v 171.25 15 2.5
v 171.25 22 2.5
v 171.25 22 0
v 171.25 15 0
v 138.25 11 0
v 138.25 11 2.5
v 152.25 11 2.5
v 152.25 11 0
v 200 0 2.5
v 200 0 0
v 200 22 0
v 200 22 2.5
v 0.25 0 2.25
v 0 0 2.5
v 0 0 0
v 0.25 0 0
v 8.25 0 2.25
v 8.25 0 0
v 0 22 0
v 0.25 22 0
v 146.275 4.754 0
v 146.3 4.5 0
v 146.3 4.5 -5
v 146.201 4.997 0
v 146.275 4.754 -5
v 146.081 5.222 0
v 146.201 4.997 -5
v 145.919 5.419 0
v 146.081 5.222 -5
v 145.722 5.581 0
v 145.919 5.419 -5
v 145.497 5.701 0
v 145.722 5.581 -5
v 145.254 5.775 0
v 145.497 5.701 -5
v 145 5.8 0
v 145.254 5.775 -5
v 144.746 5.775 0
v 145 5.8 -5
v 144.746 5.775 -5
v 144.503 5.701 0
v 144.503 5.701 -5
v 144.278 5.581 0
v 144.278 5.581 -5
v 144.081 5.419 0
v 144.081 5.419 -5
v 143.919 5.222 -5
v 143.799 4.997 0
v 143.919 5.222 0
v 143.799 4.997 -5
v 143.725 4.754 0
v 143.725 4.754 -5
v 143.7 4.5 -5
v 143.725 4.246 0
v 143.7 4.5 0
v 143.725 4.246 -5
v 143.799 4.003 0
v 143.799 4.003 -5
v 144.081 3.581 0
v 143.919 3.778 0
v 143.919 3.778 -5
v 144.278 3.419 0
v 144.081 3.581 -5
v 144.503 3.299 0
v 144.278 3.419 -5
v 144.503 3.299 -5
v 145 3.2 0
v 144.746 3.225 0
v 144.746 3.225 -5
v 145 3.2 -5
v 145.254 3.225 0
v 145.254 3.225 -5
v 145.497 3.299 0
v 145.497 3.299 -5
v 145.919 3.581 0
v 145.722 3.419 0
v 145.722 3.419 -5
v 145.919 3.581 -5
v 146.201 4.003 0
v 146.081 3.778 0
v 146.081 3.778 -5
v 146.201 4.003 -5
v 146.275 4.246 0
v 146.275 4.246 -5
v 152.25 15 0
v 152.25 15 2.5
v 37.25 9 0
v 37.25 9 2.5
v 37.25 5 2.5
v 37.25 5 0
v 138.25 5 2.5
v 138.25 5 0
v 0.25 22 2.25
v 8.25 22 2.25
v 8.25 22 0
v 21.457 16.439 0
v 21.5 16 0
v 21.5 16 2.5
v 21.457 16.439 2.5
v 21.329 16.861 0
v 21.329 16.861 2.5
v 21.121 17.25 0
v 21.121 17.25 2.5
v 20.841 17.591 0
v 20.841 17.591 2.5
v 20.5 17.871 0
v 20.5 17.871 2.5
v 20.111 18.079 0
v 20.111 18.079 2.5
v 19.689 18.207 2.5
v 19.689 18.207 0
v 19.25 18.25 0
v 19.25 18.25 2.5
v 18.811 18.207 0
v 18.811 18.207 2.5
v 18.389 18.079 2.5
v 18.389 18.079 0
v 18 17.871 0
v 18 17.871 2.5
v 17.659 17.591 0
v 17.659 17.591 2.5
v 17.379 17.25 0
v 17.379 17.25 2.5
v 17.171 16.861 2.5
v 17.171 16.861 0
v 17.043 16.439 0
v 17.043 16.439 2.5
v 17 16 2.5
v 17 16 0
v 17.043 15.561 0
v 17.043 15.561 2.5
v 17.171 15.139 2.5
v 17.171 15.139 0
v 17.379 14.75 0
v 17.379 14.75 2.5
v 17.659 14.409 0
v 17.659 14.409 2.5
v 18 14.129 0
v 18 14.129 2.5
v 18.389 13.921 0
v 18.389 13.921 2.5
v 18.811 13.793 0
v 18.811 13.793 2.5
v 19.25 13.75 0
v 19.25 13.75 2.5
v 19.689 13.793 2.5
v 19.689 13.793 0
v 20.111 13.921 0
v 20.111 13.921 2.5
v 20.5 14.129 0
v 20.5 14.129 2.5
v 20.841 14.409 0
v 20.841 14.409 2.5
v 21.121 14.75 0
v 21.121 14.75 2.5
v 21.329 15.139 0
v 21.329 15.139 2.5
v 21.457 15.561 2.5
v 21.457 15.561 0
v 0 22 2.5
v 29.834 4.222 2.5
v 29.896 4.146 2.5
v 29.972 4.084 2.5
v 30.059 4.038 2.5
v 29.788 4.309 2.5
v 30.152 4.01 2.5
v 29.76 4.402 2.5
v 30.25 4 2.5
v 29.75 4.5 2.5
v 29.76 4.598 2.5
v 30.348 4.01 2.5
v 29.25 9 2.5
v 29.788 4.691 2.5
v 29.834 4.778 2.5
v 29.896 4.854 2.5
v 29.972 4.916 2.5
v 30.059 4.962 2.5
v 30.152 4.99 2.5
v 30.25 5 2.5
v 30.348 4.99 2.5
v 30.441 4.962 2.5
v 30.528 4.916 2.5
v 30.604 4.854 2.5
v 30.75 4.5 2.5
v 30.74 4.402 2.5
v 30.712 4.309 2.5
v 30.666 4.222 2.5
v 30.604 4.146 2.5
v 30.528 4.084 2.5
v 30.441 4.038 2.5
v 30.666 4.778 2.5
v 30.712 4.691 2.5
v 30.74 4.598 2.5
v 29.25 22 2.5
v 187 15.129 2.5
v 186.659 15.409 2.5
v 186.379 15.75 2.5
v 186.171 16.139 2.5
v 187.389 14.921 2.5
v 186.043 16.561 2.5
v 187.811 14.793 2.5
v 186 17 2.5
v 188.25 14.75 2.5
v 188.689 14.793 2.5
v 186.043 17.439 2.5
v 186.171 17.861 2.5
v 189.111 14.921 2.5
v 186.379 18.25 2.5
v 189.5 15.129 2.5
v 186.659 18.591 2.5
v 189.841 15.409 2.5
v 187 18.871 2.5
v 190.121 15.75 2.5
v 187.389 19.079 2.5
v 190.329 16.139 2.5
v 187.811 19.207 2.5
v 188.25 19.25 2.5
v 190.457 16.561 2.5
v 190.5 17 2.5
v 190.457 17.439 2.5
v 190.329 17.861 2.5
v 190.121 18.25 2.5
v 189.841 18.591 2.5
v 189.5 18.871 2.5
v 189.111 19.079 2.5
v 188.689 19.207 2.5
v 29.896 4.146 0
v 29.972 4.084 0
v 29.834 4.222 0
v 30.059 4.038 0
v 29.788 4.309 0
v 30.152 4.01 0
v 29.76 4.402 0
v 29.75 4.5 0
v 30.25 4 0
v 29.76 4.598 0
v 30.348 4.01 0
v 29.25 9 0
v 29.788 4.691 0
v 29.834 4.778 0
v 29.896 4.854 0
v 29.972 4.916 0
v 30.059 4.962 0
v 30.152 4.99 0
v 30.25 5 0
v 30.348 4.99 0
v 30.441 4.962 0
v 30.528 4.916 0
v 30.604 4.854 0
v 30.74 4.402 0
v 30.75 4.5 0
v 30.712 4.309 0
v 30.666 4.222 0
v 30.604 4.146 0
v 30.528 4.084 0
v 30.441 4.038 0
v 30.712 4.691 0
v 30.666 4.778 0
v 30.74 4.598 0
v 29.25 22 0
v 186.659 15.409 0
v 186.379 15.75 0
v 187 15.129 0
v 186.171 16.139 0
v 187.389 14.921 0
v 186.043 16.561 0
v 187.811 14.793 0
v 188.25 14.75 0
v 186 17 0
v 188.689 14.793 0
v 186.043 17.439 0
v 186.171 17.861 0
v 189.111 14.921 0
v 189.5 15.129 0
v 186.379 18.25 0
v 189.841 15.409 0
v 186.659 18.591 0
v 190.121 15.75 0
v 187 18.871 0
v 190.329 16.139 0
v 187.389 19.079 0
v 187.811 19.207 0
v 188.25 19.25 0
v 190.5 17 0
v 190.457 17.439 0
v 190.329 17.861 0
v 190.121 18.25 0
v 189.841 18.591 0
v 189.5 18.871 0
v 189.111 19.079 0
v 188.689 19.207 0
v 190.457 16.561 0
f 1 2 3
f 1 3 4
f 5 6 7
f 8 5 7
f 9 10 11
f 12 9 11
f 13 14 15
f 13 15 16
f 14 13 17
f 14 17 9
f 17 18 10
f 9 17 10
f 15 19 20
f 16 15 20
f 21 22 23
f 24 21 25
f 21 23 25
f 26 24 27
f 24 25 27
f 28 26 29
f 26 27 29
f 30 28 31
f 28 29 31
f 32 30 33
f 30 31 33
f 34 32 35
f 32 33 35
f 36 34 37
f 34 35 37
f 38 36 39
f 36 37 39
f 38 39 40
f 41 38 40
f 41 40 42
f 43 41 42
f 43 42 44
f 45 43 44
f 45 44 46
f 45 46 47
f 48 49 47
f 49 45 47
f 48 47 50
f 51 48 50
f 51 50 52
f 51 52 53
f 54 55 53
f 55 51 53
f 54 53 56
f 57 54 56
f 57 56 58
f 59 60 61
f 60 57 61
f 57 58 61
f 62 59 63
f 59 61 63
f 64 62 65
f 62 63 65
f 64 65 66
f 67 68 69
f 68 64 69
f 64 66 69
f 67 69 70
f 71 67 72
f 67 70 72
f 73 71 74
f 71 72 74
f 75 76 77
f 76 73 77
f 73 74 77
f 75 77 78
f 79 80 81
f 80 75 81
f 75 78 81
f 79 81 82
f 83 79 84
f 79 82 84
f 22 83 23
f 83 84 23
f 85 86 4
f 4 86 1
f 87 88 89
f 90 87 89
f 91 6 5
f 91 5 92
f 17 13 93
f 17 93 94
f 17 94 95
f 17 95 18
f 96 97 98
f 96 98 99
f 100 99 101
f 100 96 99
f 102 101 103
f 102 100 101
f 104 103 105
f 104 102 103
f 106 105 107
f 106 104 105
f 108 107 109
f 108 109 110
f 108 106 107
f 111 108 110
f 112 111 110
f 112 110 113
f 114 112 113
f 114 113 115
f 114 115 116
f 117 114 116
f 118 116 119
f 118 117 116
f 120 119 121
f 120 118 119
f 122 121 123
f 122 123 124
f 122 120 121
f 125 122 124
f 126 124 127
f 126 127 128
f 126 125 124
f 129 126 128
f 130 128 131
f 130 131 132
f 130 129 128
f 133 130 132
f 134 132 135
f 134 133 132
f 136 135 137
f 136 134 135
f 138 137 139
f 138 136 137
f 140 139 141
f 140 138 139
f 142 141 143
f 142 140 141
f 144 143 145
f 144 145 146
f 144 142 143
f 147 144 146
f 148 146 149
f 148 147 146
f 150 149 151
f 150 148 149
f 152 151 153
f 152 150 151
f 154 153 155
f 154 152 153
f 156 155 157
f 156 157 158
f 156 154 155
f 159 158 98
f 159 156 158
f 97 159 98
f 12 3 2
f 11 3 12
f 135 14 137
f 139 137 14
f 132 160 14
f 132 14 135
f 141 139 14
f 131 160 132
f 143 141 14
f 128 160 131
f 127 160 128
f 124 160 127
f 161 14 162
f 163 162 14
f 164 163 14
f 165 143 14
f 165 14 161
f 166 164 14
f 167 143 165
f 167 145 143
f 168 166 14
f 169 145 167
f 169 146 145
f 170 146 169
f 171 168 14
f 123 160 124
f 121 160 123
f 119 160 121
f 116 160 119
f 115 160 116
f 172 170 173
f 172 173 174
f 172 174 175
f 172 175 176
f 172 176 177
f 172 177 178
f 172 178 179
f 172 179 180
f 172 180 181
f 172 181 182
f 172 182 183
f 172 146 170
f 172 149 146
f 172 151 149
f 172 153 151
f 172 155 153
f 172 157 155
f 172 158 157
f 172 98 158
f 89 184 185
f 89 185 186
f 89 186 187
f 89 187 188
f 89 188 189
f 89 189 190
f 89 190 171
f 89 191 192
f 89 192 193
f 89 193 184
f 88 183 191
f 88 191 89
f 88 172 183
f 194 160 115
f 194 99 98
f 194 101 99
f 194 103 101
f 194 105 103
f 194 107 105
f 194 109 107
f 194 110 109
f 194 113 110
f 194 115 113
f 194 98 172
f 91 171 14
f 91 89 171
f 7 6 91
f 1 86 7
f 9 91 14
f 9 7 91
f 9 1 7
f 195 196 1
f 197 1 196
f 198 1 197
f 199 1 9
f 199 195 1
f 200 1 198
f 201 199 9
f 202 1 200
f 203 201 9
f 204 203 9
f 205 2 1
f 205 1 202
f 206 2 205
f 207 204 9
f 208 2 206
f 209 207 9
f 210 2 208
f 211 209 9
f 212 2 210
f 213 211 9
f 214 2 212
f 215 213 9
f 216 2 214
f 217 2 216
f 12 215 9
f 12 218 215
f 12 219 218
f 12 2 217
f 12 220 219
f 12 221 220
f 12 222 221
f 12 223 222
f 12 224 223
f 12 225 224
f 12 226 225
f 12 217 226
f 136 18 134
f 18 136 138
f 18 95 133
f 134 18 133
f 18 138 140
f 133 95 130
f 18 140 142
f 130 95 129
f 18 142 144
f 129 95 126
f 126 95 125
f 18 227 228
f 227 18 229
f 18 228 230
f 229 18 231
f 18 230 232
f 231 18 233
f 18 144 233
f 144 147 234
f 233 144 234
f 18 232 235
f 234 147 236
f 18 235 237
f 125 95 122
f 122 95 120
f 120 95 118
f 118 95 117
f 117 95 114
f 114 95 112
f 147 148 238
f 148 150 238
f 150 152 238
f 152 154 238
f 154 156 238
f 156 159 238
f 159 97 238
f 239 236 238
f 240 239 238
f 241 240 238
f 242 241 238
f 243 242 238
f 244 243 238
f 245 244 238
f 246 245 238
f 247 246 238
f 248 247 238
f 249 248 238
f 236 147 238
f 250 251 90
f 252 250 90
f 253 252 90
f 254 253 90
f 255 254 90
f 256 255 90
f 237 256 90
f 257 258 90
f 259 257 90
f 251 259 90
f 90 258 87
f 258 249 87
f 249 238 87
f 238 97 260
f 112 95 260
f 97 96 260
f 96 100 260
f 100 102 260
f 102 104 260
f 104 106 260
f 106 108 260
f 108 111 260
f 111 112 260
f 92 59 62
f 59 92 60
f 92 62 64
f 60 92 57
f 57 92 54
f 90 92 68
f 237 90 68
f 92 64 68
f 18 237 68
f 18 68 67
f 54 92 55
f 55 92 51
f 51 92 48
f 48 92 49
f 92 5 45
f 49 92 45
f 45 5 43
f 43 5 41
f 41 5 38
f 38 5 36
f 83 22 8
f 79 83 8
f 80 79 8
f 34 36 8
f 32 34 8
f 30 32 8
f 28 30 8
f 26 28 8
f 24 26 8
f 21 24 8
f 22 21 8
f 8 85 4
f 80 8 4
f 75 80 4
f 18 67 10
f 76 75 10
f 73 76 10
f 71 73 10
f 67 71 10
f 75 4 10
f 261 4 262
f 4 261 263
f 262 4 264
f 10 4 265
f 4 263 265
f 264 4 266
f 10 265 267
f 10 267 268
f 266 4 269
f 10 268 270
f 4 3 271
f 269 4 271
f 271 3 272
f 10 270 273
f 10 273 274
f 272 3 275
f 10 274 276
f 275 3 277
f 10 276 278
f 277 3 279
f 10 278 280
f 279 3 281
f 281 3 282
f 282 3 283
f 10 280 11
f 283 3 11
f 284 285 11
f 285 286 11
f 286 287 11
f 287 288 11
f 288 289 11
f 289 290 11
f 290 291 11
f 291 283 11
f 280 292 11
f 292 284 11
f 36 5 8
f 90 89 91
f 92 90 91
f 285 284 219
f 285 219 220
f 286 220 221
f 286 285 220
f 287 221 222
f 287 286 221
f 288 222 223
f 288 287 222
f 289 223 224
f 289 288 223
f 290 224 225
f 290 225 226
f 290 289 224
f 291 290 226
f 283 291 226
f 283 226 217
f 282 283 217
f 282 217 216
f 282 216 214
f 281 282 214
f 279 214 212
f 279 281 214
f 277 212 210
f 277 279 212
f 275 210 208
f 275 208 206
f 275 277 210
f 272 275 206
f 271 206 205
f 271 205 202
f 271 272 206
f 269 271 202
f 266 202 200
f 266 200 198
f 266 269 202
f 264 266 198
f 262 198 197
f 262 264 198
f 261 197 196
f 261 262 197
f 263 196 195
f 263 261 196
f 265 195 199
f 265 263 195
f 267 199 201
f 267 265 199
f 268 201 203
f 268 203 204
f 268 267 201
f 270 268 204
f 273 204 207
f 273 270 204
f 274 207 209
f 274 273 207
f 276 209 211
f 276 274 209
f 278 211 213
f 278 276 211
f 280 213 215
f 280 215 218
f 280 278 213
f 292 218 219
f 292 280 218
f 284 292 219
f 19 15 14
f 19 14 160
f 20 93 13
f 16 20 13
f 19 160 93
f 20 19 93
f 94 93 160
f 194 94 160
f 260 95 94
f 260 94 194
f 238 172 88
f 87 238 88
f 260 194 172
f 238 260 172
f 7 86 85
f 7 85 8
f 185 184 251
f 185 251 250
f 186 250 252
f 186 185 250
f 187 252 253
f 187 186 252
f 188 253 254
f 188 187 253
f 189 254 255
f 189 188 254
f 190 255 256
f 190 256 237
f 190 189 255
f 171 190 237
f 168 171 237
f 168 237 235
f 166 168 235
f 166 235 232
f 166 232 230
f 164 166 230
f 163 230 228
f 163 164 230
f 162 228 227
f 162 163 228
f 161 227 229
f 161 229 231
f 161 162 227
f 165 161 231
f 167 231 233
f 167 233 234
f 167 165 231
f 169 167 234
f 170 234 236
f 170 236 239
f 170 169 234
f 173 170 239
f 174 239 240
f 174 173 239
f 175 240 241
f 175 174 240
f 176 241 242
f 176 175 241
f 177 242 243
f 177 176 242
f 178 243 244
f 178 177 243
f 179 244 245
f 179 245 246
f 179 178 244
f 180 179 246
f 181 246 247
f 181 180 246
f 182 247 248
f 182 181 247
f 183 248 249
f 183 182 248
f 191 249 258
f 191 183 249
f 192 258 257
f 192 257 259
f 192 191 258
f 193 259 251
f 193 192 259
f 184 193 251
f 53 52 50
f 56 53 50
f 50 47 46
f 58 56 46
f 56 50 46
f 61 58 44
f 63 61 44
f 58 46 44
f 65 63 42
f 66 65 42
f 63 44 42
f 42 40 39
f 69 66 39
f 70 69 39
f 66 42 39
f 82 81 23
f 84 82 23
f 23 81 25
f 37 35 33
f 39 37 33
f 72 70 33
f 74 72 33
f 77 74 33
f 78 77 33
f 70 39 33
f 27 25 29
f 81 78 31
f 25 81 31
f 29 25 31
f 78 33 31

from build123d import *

# Parameters (mm, degrees)
BOX_W             = 200
BOX_H             = 22
BOX_DEPTH         = 2.5
CYLINDER_R        = 2.25
CYLINDER_DEPTH    = 2.5
CYLINDER001_R     = 2.25
CYLINDER001_DEPTH = 2.5
CYLINDER003_R     = 1.3
CYLINDER003_DEPTH = 6
CYLINDER004_R     = 0.5
CYLINDER004_DEPTH = 2.5
BOX003_W          = 8
BOX003_H          = 22
BOX003_DEPTH      = 10
BOX004_W          = 101
BOX004_H          = 10
BOX004_DEPTH      = 2.5
BOX005_W          = 142
BOX005_H          = 7
BOX005_DEPTH      = 2.5
BOX006_W          = 8
BOX006_H          = 6
BOX006_DEPTH      = 10
BOX007_W          = 14
BOX007_H          = 4
BOX007_DEPTH      = 2.5


with BuildPart() as part:
    # Box → Box (join)
    with BuildSketch(Plane.XY):
        with Locations((100, 11)):
            Rectangle(BOX_W, BOX_H)
    extrude(amount=BOX_DEPTH)

    # Cylinder → Cylinder (cut)
    with BuildSketch(Plane(origin=(19.25, 16, 0), x_dir=(1, 0, 0), z_dir=(0, 0, 1))):
        Circle(CYLINDER_R)
    extrude(amount=CYLINDER_DEPTH, mode=Mode.SUBTRACT)

    # Cylinder001 → Cylinder001 (cut)
    with BuildSketch(Plane(origin=(188.25, 17, 0), x_dir=(1, 0, 0), z_dir=(0, 0, 1))):
        Circle(CYLINDER001_R)
    extrude(amount=CYLINDER001_DEPTH, mode=Mode.SUBTRACT)

    # Cylinder003 → Cylinder003 (join)
    with BuildSketch(Plane(origin=(145, 4.5, -5), x_dir=(1, 0, 0), z_dir=(0, 0, 1))):
        Circle(CYLINDER003_R)
    extrude(amount=CYLINDER003_DEPTH)

    # Cylinder004 → Cylinder004 (cut)
    with BuildSketch(Plane(origin=(30.25, 4.5, 2.5), x_dir=(1, 0, 0), z_dir=(0, 0, -1))):
        Circle(CYLINDER004_R)
    extrude(amount=CYLINDER004_DEPTH, mode=Mode.SUBTRACT)

    # Box003 → Box003 (cut)
    with BuildSketch(Plane(origin=(0.25, 22, 2.25), x_dir=(1, 0, 0), z_dir=(0, 0, -1))):
        with Locations((4, 11)):
            Rectangle(BOX003_W, BOX003_H)
    extrude(amount=BOX003_DEPTH, mode=Mode.SUBTRACT)

    # Box004 → Box004 (cut)
    with BuildSketch(Plane(origin=(37.25, 15, 2.5), x_dir=(1, 0, 0), z_dir=(0, 0, -1))):
        with Locations((50.5, 5)):
            Rectangle(BOX004_W, BOX004_H)
    extrude(amount=BOX004_DEPTH, mode=Mode.SUBTRACT)

    # Box005 → Box005 (cut)
    with BuildSketch(Plane(origin=(29.25, 22, 2.5), x_dir=(1, 0, 0), z_dir=(0, 0, -1))):
        with Locations((71, 3.5)):
            Rectangle(BOX005_W, BOX005_H)
    extrude(amount=BOX005_DEPTH, mode=Mode.SUBTRACT)

    # Box006 → Box006 (cut)
    with BuildSketch(Plane(origin=(29.25, 15, 2.5), x_dir=(1, 0, 0), z_dir=(0, 0, -1))):
        with Locations((4, 3)):
            Rectangle(BOX006_W, BOX006_H)
    extrude(amount=BOX006_DEPTH, mode=Mode.SUBTRACT)

    # Box007 → Box007 (cut)
    with BuildSketch(Plane(origin=(138.25, 15, 2.5), x_dir=(1, 0, 0), z_dir=(0, 0, -1))):
        with Locations((7, 2)):
            Rectangle(BOX007_W, BOX007_H)
    extrude(amount=BOX007_DEPTH, mode=Mode.SUBTRACT)


solid = part.part
